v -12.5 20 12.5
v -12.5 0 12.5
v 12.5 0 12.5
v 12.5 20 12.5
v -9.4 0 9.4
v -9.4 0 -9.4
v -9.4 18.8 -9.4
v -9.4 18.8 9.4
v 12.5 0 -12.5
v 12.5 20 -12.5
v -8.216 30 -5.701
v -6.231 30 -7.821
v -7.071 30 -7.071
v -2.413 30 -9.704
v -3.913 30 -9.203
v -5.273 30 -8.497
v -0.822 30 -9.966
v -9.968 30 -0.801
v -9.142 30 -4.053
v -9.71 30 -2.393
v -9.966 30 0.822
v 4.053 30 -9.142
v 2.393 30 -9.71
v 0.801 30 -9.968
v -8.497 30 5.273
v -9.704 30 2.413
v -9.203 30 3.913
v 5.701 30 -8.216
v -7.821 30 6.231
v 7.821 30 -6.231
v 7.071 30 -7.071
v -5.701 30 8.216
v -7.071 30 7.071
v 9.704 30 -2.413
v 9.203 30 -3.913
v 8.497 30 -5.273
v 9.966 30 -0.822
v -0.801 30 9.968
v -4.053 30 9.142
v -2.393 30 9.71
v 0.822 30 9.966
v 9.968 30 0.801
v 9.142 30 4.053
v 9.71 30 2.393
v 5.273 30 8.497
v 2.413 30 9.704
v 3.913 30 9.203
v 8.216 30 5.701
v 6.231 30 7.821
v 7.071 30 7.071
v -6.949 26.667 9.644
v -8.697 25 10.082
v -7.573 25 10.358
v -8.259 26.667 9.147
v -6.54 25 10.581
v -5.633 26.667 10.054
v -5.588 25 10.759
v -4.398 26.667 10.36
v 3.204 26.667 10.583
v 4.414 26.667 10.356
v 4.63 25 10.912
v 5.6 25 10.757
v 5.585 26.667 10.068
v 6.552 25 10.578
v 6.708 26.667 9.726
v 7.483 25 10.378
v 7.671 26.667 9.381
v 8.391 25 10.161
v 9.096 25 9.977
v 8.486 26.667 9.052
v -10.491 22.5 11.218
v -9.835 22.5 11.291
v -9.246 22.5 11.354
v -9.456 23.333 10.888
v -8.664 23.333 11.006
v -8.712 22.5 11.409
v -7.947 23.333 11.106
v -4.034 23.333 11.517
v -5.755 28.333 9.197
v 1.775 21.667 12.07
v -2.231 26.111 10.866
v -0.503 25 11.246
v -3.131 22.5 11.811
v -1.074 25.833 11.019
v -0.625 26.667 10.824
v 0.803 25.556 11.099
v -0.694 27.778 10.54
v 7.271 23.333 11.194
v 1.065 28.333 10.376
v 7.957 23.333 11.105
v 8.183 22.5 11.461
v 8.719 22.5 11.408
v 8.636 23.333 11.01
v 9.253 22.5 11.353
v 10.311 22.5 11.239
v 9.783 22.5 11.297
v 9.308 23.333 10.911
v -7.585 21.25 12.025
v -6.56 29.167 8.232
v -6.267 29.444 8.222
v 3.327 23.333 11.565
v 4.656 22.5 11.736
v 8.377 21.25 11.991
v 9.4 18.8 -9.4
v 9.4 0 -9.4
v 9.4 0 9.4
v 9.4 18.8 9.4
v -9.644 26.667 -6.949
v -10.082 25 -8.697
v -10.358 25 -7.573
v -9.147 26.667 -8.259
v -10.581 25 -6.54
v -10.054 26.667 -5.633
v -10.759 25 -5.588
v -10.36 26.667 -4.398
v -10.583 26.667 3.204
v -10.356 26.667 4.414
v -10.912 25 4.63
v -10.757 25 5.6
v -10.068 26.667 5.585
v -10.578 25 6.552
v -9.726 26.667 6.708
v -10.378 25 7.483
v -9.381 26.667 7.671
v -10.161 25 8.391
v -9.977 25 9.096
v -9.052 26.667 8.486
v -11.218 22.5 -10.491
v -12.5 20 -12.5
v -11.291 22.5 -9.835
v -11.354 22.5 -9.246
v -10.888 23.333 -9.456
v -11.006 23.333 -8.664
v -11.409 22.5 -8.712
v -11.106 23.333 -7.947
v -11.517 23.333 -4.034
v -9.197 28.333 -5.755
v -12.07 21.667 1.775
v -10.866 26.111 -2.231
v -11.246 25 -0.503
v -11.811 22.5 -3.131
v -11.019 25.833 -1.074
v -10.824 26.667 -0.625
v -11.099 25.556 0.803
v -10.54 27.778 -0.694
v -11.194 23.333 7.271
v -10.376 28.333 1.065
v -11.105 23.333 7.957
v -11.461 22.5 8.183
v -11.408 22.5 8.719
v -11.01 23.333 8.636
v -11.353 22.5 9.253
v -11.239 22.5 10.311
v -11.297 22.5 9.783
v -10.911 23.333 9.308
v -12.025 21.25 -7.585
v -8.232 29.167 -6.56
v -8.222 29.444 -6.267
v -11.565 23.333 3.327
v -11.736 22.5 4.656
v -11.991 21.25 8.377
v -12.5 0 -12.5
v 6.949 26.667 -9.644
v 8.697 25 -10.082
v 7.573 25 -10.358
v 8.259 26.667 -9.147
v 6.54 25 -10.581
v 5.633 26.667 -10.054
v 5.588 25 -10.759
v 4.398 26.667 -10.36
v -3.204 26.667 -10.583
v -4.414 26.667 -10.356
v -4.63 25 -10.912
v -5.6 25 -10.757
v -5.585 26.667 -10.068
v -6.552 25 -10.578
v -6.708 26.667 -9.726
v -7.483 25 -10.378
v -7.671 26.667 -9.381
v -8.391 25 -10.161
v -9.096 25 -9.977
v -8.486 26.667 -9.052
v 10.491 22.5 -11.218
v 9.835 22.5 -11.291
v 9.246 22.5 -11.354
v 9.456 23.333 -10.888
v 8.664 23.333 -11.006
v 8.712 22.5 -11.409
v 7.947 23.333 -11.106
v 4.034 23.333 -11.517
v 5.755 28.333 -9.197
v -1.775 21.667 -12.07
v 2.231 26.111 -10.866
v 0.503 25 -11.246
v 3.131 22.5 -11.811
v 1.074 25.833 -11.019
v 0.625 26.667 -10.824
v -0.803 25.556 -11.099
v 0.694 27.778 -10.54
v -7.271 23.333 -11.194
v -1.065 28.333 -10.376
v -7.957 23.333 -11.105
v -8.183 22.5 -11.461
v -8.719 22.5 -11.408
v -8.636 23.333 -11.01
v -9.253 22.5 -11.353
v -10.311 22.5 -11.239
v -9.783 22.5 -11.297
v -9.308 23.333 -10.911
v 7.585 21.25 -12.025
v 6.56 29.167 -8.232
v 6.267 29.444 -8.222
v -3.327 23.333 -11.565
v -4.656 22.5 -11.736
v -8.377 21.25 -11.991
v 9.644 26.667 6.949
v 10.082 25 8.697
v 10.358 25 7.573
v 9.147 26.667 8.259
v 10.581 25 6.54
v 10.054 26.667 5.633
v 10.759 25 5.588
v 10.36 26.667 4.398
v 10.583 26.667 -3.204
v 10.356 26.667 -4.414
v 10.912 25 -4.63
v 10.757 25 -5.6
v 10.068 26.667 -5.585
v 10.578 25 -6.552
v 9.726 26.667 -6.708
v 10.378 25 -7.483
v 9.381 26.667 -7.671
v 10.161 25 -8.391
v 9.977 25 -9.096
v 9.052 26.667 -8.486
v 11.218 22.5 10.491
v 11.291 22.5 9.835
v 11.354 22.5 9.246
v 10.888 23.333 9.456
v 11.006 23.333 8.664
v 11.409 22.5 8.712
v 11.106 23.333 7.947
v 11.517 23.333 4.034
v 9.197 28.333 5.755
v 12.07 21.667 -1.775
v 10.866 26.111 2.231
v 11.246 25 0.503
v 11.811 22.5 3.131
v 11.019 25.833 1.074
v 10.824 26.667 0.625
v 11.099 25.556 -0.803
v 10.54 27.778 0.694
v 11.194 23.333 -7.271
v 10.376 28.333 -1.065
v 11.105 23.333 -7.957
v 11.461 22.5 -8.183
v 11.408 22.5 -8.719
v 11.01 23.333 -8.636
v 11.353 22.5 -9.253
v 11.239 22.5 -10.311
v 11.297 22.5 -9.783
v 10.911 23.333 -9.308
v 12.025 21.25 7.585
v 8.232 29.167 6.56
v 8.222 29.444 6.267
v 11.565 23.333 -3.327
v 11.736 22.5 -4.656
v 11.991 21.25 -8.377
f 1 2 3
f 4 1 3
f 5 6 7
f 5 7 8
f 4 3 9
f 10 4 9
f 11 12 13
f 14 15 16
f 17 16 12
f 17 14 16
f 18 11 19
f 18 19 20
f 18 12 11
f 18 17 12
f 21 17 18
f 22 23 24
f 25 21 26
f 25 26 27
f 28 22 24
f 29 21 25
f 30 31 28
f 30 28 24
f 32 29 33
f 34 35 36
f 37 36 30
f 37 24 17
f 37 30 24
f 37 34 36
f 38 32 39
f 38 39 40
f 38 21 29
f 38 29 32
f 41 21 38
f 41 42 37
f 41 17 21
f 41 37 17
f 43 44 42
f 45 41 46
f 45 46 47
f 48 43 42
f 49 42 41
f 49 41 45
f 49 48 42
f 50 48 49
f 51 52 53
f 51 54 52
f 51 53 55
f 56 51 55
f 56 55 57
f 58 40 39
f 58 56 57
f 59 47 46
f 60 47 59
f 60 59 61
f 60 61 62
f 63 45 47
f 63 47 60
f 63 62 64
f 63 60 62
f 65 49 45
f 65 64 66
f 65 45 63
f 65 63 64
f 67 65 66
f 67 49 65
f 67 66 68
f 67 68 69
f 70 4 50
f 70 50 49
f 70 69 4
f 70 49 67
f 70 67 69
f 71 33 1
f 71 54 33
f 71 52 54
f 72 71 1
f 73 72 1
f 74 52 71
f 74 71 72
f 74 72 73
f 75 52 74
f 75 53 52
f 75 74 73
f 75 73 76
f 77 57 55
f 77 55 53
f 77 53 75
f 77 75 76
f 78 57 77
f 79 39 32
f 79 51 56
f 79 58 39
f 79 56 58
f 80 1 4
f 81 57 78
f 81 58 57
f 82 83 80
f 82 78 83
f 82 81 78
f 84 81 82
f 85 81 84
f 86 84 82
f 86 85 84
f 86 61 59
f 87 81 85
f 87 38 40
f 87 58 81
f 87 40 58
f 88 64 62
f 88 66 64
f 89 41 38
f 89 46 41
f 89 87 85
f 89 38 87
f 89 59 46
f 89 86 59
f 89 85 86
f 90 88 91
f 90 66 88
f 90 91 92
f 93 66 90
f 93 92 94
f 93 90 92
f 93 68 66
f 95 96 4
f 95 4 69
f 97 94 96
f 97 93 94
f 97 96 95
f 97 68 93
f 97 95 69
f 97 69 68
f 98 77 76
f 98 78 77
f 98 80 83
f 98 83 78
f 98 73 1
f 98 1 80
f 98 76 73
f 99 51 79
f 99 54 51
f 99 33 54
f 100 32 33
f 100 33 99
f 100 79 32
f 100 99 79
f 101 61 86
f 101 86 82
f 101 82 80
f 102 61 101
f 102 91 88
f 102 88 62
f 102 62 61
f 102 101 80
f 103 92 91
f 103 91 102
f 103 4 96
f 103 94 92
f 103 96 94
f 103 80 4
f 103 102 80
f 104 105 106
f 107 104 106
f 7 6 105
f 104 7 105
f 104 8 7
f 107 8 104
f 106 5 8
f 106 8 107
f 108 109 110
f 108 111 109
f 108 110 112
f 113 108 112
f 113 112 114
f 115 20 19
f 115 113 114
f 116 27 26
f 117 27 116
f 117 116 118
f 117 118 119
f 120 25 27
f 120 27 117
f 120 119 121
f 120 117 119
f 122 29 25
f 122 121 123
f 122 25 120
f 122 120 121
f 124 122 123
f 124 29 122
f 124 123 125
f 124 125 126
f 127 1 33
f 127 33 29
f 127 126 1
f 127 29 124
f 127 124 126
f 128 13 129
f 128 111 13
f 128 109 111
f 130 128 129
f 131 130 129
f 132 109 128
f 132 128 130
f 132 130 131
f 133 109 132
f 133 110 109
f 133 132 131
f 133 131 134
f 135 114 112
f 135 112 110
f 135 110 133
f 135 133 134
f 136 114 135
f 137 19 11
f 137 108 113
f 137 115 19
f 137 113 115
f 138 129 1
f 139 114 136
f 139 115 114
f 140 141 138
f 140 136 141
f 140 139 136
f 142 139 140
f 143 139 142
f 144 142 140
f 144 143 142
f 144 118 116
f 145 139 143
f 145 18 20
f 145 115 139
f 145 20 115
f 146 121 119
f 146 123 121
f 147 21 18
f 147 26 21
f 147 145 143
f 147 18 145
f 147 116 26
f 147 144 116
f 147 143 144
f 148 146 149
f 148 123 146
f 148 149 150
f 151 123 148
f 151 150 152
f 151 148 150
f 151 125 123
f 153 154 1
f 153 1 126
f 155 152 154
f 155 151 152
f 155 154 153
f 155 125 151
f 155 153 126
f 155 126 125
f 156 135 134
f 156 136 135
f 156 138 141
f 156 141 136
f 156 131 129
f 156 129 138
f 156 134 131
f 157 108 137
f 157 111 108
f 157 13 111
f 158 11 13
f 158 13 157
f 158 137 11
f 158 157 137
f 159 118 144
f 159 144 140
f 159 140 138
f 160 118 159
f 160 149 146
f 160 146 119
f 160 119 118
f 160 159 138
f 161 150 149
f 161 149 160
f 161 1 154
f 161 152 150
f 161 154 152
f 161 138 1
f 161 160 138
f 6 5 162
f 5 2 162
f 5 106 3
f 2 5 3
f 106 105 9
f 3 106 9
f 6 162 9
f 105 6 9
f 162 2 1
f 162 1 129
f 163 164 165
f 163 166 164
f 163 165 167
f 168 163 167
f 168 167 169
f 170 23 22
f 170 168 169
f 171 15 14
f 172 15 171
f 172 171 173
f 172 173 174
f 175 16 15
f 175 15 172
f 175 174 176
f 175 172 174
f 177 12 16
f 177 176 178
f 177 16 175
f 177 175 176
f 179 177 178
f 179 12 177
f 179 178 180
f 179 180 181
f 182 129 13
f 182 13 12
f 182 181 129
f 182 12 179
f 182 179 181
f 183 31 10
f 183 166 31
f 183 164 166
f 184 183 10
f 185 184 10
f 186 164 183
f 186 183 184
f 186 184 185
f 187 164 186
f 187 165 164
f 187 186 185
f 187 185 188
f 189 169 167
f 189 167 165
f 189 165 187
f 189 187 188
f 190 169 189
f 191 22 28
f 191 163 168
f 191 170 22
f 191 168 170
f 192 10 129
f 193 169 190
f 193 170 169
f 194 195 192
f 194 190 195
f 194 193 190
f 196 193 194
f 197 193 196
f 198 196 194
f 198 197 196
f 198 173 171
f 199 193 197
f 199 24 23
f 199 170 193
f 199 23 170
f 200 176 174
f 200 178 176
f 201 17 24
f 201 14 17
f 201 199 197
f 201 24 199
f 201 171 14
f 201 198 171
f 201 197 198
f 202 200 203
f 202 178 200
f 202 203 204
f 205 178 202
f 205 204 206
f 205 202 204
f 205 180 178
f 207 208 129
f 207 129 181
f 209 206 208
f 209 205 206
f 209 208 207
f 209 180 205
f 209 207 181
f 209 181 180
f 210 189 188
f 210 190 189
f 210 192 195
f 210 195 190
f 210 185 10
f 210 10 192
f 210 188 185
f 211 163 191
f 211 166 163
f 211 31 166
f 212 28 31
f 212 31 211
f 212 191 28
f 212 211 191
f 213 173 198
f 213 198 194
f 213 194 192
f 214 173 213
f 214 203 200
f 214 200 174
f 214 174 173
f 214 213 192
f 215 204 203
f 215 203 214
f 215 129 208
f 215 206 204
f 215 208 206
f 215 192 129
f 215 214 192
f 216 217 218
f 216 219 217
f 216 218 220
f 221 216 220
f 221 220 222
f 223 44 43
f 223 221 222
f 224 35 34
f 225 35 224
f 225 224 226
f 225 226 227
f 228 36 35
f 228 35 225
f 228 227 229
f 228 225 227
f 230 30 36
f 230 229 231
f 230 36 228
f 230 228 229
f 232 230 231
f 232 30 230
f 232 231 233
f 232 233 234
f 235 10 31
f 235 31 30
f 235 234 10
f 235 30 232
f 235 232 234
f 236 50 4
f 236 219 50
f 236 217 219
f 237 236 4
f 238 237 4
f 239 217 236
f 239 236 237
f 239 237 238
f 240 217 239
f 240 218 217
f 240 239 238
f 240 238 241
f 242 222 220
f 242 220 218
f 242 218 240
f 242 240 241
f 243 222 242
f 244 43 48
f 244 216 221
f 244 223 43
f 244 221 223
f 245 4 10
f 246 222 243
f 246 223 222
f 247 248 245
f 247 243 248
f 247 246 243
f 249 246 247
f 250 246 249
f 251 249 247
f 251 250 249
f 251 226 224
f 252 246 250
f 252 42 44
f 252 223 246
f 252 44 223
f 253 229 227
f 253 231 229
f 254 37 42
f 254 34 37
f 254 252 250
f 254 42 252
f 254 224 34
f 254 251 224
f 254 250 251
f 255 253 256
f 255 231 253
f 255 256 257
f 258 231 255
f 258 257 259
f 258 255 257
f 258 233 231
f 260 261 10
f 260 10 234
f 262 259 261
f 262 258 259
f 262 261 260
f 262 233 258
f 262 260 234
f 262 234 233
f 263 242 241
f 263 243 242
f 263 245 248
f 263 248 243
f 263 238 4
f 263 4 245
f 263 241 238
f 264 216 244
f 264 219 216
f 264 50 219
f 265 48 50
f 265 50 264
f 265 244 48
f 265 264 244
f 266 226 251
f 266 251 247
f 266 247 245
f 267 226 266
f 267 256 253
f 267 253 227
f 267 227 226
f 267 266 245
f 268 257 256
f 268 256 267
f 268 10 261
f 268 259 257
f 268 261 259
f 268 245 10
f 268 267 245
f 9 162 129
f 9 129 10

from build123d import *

# Parameters (mm, degrees)
SKETCH2_W           = 25
SKETCH2_H           = 25
BOSS_EXTRUDE1_DEPTH = 20
SKETCH3_W           = 18.8
SKETCH3_H           = 18.8
CUT_EXTRUDE1_DEPTH  = 18.8


with BuildPart() as part:
    # Sketch2 → Boss-Extrude1 (new body)
    with BuildSketch(Plane(origin=(0, 0, 0), x_dir=(1, 0, 0), z_dir=(0, 1, 0))):
        Rectangle(SKETCH2_W, SKETCH2_H)
    extrude(amount=BOSS_EXTRUDE1_DEPTH)

    # Sketch3 → Cut-Extrude1 (cut)
    with BuildSketch(Plane.XZ):
        Rectangle(SKETCH3_W, SKETCH3_H)
    extrude(amount=-CUT_EXTRUDE1_DEPTH, mode=Mode.SUBTRACT)

    # Loft1: read off the stored shape, not the designer's step
    # Loft1: loft between two sections, ruled curve by curve
    loft1_from = [
        Edge.make_bspline([(-12.5, 20, 12.5), (-11.458333333, 20, 12.5), (-10.416666667, 20, 12.5), (-8.333333333, 20, 12.5), (-7.291666667, 20, 12.5), (-5.208333333, 20, 12.5), (-4.166666667, 20, 12.5), (-2.083333333, 20, 12.5), (-1.041666667, 20, 12.5), (1.041666667, 20, 12.5), (2.083333333, 20, 12.5), (4.166666667, 20, 12.5), (5.208333333, 20, 12.5), (7.291666667, 20, 12.5), (8.333333333, 20, 12.5), (10.416666667, 20, 12.5), (11.458333333, 20, 12.5), (12.5, 20, 12.5)], [0, 0, 0, 0, 0.125, 0.125, 0.25, 0.25, 0.375, 0.375, 0.5, 0.5, 0.625, 0.625, 0.75, 0.75, 0.875, 0.875, 1, 1, 1, 1], 3),
        Edge.make_bspline([(12.5, 20, 12.5), (12.5, 20, 11.458333333), (12.5, 20, 10.416666667), (12.5, 20, 8.333333333), (12.5, 20, 7.291666667), (12.5, 20, 5.208333333), (12.5, 20, 4.166666667), (12.5, 20, 2.083333333), (12.5, 20, 1.041666667), (12.5, 20, -1.041666667), (12.5, 20, -2.083333333), (12.5, 20, -4.166666667), (12.5, 20, -5.208333333), (12.5, 20, -7.291666667), (12.5, 20, -8.333333333), (12.5, 20, -10.416666667), (12.5, 20, -11.458333333), (12.5, 20, -12.5)], [0, 0, 0, 0, 0.125, 0.125, 0.25, 0.25, 0.375, 0.375, 0.5, 0.5, 0.625, 0.625, 0.75, 0.75, 0.875, 0.875, 1, 1, 1, 1], 3),
        Edge.make_bspline([(-12.5, 20, -12.5), (-12.5, 20, -11.458333333), (-12.5, 20, -10.416666667), (-12.5, 20, -8.333333333), (-12.5, 20, -7.291666667), (-12.5, 20, -5.208333333), (-12.5, 20, -4.166666667), (-12.5, 20, -2.083333333), (-12.5, 20, -1.041666667), (-12.5, 20, 1.041666667), (-12.5, 20, 2.083333333), (-12.5, 20, 4.166666667), (-12.5, 20, 5.208333333), (-12.5, 20, 7.291666667), (-12.5, 20, 8.333333333), (-12.5, 20, 10.416666667), (-12.5, 20, 11.458333333), (-12.5, 20, 12.5)], [0, 0, 0, 0, 0.125, 0.125, 0.25, 0.25, 0.375, 0.375, 0.5, 0.5, 0.625, 0.625, 0.75, 0.75, 0.875, 0.875, 1, 1, 1, 1], 3),
        Edge.make_bspline([(12.5, 20, -12.5), (11.458333333, 20, -12.5), (10.416666667, 20, -12.5), (8.333333333, 20, -12.5), (7.291666667, 20, -12.5), (5.208333333, 20, -12.5), (4.166666667, 20, -12.5), (2.083333333, 20, -12.5), (1.041666667, 20, -12.5), (-1.041666667, 20, -12.5), (-2.083333333, 20, -12.5), (-4.166666667, 20, -12.5), (-5.208333333, 20, -12.5), (-7.291666667, 20, -12.5), (-8.333333333, 20, -12.5), (-10.416666667, 20, -12.5), (-11.458333333, 20, -12.5), (-12.5, 20, -12.5)], [0, 0, 0, 0, 0.125, 0.125, 0.25, 0.25, 0.375, 0.375, 0.5, 0.5, 0.625, 0.625, 0.75, 0.75, 0.875, 0.875, 1, 1, 1, 1], 3),
    ]
    loft1_to = [
        Edge.make_bspline([(-7.071067812, 30, 7.071067812), (-6.654401145, 30, 7.487734479), (-6.18511191, 30, 7.882942296), (-5.147579804, 30, 8.596441749), (-4.57928395, 30, 8.914502371), (-3.364263, 30, 9.440335189), (-2.717633031, 30, 9.647849649), (-1.380556459, 30, 9.927768934), (-0.690355937, 30, 10), (0.690355937, 30, 10), (1.380556459, 30, 9.927768934), (2.717633031, 30, 9.647849649), (3.364263, 30, 9.440335189), (4.57928395, 30, 8.914502371), (5.147579804, 30, 8.596441749), (6.18511191, 30, 7.882942296), (6.654401145, 30, 7.487734479), (7.071067812, 30, 7.071067812)], [0, 0, 0, 0, 0.125, 0.125, 0.25, 0.25, 0.375, 0.375, 0.5, 0.5, 0.625, 0.625, 0.75, 0.75, 0.875, 0.875, 1, 1, 1, 1], 3),
        Edge.make_bspline([(7.071067812, 30, 7.071067812), (7.487734479, 30, 6.654401145), (7.882942296, 30, 6.18511191), (8.596441749, 30, 5.147579804), (8.914502371, 30, 4.57928395), (9.440335189, 30, 3.364263), (9.647849649, 30, 2.717633031), (9.927768934, 30, 1.380556459), (10, 30, 0.690355937), (10, 30, -0.690355937), (9.927768934, 30, -1.380556459), (9.647849649, 30, -2.717633031), (9.440335189, 30, -3.364263), (8.914502371, 30, -4.57928395), (8.596441749, 30, -5.147579804), (7.882942296, 30, -6.18511191), (7.487734479, 30, -6.654401145), (7.071067812, 30, -7.071067812)], [0, 0, 0, 0, 0.125, 0.125, 0.25, 0.25, 0.375, 0.375, 0.5, 0.5, 0.625, 0.625, 0.75, 0.75, 0.875, 0.875, 1, 1, 1, 1], 3),
        Edge.make_bspline([(-7.071067812, 30, -7.071067812), (-7.487734479, 30, -6.654401145), (-7.882942296, 30, -6.18511191), (-8.596441749, 30, -5.147579804), (-8.914502371, 30, -4.57928395), (-9.440335189, 30, -3.364263), (-9.647849649, 30, -2.717633031), (-9.927768934, 30, -1.380556459), (-10, 30, -0.690355937), (-10, 30, 0.690355937), (-9.927768934, 30, 1.380556459), (-9.647849649, 30, 2.717633031), (-9.440335189, 30, 3.364263), (-8.914502371, 30, 4.57928395), (-8.596441749, 30, 5.147579804), (-7.882942296, 30, 6.18511191), (-7.487734479, 30, 6.654401145), (-7.071067812, 30, 7.071067812)], [0, 0, 0, 0, 0.125, 0.125, 0.25, 0.25, 0.375, 0.375, 0.5, 0.5, 0.625, 0.625, 0.75, 0.75, 0.875, 0.875, 1, 1, 1, 1], 3),
        Edge.make_bspline([(7.071067812, 30, -7.071067812), (6.654401145, 30, -7.487734479), (6.18511191, 30, -7.882942296), (5.147579804, 30, -8.596441749), (4.57928395, 30, -8.914502371), (3.364263, 30, -9.440335189), (2.717633031, 30, -9.647849649), (1.380556459, 30, -9.927768934), (0.690355937, 30, -10), (-0.690355937, 30, -10), (-1.380556459, 30, -9.927768934), (-2.717633031, 30, -9.647849649), (-3.364263, 30, -9.440335189), (-4.57928395, 30, -8.914502371), (-5.147579804, 30, -8.596441749), (-6.18511191, 30, -7.882942296), (-6.654401145, 30, -7.487734479), (-7.071067812, 30, -7.071067812)], [0, 0, 0, 0, 0.125, 0.125, 0.25, 0.25, 0.375, 0.375, 0.5, 0.5, 0.625, 0.625, 0.75, 0.75, 0.875, 0.875, 1, 1, 1, 1], 3),
    ]
    loft1 = Solid(Shell([*[Face.make_surface_from_curves(loft1_from[k], loft1_to[k]) for k in range(4)], Face(Wire(loft1_from)), Face(Wire(loft1_to))]))
    add(loft1)


solid = part.part
